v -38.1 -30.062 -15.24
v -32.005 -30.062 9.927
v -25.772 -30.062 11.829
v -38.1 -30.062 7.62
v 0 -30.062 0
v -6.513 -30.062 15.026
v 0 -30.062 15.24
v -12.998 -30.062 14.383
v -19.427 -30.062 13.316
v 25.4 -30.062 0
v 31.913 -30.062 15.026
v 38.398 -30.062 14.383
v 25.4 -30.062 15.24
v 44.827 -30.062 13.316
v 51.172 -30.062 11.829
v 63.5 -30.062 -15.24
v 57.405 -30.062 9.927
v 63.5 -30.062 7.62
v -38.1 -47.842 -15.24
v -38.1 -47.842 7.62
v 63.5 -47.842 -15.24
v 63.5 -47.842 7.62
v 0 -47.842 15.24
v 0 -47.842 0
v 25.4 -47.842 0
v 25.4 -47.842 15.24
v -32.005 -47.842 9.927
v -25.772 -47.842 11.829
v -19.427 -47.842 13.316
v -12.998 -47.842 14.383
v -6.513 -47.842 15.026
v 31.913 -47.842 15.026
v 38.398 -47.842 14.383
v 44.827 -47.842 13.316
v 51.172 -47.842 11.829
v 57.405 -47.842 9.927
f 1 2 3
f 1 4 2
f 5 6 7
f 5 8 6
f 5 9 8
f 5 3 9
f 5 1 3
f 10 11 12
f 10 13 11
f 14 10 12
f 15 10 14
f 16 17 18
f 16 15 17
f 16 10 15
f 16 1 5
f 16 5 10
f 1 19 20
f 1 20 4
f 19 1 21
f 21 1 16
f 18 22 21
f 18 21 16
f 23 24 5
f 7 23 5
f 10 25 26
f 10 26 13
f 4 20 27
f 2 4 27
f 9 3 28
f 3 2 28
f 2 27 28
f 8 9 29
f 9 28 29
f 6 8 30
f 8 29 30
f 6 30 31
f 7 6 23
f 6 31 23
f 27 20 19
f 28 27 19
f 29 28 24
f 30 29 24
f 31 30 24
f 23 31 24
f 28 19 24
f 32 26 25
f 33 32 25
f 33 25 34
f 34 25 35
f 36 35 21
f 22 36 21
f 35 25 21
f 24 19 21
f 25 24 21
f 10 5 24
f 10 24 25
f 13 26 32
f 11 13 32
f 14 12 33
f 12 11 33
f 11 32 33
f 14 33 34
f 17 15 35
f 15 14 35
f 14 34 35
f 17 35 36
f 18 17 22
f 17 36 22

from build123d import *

# Parameters (mm, degrees)
F0_W     = 38.1
F0_H     = 17.78
F0_W_2   = 25.4
F1_DEPTH = 15.24
F2_DEPTH = 15.24
F4_DEPTH = 25.4


with BuildPart() as f1:
    # F0 (on Top) → F1 (new body)
    with BuildSketch(Plane.XY):
        with Locations((-19.05, -38.952387)):
            Rectangle(F0_W, F0_H)
        with Locations((12.7, -38.952387)):
            Rectangle(F0_W_2, F0_H)
        with Locations((44.45, -38.952387)):
            Rectangle(F0_W, F0_H)
    extrude(amount=-F1_DEPTH)

    # F0 (on Top) → F2 (join)
    with BuildSketch(Plane.XY):
        with Locations((-19.05, -38.952387)):
            Rectangle(F0_W, F0_H)
        with Locations((44.45, -38.952387)):
            Rectangle(F0_W, F0_H)
    extrude(amount=F2_DEPTH)

    # F3 (on face) → F4 (cut)
    with BuildSketch(Plane.XZ.offset(47.842387)):
        with BuildLine():
            ThreePointArc((-38.1, 7.62), (-19.427264, 13.316322), (0, 15.24))
            Line((0, 15.24), (-38.1, 15.24))
            Line((-38.1, 15.24), (-38.1, 7.62))
        make_face()
        with BuildLine():
            Line((63.5, 15.24), (25.4, 15.24))
            ThreePointArc((25.4, 15.24), (44.827264, 13.316322), (63.5, 7.62))
            Line((63.5, 7.62), (63.5, 15.24))
        make_face()
    extrude(amount=-F4_DEPTH, mode=Mode.SUBTRACT)


solid = f1.part
